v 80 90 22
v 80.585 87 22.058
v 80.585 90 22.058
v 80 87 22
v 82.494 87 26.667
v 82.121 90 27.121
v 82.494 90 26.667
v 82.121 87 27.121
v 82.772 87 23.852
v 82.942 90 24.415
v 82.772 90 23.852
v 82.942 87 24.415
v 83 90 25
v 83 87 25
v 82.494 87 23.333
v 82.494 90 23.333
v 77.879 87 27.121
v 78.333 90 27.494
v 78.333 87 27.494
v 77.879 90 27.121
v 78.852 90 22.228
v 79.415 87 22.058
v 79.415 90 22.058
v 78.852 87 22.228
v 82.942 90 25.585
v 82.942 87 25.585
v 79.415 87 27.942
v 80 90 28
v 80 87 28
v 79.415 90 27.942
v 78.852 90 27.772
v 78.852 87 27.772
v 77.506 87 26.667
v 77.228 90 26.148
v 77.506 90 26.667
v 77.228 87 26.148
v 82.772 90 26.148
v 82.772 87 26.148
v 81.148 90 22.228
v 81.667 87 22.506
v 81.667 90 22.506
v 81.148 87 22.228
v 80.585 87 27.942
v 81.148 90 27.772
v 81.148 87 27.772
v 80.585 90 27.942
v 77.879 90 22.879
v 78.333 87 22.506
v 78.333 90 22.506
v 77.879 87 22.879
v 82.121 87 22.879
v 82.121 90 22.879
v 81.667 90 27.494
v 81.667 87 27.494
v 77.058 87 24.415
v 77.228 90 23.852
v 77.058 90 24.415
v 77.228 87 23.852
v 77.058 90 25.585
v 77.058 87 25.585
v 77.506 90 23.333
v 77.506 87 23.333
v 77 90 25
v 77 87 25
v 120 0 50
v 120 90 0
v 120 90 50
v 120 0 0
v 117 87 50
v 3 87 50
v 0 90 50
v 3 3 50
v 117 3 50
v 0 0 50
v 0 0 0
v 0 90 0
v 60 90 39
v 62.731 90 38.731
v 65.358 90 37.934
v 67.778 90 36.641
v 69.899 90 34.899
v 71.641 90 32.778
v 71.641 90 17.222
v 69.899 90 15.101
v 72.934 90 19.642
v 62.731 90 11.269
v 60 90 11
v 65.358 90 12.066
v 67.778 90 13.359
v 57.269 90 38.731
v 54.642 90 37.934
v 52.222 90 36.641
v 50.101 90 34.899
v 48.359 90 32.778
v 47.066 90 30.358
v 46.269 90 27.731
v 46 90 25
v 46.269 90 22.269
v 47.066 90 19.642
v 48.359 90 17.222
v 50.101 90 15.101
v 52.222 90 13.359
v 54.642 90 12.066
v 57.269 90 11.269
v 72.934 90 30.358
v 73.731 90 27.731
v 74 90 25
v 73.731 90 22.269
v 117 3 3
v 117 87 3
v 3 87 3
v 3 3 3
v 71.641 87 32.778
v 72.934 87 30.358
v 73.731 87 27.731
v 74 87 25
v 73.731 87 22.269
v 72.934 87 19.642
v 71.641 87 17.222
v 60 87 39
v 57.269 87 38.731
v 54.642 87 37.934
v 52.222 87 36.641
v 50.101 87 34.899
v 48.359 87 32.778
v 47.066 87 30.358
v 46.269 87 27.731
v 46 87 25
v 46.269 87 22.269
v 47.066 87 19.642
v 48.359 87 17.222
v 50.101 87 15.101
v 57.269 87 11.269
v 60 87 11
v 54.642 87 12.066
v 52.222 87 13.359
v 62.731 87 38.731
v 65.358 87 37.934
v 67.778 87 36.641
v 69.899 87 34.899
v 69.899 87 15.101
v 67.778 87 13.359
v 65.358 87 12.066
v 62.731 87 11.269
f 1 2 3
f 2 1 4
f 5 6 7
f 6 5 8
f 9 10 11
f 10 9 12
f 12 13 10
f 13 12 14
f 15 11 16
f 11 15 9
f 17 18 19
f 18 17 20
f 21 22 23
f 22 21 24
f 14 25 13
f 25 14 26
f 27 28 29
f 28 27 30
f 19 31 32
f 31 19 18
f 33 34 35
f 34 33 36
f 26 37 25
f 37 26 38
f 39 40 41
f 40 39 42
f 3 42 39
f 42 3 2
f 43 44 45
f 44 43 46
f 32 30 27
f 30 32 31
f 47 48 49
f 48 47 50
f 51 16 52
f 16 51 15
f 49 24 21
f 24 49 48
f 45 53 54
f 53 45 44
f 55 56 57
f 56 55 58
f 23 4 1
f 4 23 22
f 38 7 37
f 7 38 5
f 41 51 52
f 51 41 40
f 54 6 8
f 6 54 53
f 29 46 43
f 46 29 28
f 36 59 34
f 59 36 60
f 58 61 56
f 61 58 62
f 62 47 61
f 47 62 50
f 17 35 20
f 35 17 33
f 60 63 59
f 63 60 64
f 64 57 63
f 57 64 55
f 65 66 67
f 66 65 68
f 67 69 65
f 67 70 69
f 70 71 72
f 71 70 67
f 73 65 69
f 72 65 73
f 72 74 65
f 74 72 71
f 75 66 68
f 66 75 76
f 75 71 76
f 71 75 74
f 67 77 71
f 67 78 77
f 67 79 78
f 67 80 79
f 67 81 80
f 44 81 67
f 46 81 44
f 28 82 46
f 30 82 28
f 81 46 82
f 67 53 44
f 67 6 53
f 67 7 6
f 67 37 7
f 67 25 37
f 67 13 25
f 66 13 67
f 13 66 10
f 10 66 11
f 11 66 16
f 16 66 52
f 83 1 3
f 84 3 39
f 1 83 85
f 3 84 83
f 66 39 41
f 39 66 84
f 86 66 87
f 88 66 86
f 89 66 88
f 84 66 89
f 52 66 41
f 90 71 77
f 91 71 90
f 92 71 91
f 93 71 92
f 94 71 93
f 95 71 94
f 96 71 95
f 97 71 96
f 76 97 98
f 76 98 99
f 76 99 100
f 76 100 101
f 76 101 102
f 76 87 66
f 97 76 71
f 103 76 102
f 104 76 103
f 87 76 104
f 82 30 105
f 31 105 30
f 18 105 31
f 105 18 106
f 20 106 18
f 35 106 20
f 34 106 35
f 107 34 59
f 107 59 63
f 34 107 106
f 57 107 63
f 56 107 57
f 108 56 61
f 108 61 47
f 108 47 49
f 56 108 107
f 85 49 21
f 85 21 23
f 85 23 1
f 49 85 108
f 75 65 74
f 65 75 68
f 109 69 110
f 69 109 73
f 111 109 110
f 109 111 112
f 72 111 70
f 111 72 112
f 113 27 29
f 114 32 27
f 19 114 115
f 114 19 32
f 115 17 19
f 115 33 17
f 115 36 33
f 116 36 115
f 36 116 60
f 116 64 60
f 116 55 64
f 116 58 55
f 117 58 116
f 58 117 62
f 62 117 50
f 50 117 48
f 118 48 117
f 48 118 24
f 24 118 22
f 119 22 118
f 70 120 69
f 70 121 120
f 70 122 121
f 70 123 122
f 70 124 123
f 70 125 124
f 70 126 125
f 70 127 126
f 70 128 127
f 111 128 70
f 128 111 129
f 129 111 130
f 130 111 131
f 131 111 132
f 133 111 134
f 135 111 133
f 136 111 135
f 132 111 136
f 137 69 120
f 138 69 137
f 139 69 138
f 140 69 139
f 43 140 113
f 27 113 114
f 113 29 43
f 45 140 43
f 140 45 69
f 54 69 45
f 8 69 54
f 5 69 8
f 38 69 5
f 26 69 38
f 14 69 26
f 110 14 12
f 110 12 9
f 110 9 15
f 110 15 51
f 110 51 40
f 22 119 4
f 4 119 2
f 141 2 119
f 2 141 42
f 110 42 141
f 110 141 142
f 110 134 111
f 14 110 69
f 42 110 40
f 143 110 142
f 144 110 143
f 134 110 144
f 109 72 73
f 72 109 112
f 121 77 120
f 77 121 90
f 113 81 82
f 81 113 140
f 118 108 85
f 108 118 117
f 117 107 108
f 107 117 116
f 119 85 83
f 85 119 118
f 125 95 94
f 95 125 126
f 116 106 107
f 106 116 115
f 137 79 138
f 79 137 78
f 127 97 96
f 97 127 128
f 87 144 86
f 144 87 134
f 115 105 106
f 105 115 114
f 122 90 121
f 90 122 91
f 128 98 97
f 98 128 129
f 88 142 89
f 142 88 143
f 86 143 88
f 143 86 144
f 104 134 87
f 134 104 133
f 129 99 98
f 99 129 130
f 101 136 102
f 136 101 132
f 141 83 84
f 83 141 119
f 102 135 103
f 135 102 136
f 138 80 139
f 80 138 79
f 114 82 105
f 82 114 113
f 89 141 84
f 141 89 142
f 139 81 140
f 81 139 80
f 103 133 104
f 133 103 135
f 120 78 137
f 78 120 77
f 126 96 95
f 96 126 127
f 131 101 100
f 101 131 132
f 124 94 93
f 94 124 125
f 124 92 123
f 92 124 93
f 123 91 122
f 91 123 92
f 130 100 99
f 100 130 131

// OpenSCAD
$fn = 32;

// ----------------------------------------------------------------------
// Vent box: roundvent enclosure
// ----------------------------------------------------------------------

// --- parameters (mm) ---
box_l = 120;              // box length, X
box_w = 90;               // box width, Y
box_h = 50;               // box height, Z
wall_t = 3;               // shell wall thickness
vent_d = 28;              // central vent diameter
ring_d = 6;               // ring hole diameter
n_ring = 8;               // holes in the ring
ring_r = 20;              // ring radius

ring_step = 360 / n_ring;  // ring hole angular step

difference() {
  cube([box_l, box_w, box_h]);
  translate([wall_t, wall_t, wall_t])
    cube([box_l - 2 * wall_t, box_w - 2 * wall_t, box_h]);
  translate([box_l / 2, box_w - wall_t - 1, box_h / 2])
    rotate([-90, 0, 0]) cylinder(h = wall_t + 2, d = vent_d);
  for (i = [0 : n_ring - 1])
    translate([box_l / 2, box_w - wall_t - 1, box_h / 2])
      rotate([0, 0, i * ring_step])
        translate([ring_r, 0, 0]) rotate([-90, 0, 0])
          cylinder(h = wall_t + 2, d = ring_d);
}
